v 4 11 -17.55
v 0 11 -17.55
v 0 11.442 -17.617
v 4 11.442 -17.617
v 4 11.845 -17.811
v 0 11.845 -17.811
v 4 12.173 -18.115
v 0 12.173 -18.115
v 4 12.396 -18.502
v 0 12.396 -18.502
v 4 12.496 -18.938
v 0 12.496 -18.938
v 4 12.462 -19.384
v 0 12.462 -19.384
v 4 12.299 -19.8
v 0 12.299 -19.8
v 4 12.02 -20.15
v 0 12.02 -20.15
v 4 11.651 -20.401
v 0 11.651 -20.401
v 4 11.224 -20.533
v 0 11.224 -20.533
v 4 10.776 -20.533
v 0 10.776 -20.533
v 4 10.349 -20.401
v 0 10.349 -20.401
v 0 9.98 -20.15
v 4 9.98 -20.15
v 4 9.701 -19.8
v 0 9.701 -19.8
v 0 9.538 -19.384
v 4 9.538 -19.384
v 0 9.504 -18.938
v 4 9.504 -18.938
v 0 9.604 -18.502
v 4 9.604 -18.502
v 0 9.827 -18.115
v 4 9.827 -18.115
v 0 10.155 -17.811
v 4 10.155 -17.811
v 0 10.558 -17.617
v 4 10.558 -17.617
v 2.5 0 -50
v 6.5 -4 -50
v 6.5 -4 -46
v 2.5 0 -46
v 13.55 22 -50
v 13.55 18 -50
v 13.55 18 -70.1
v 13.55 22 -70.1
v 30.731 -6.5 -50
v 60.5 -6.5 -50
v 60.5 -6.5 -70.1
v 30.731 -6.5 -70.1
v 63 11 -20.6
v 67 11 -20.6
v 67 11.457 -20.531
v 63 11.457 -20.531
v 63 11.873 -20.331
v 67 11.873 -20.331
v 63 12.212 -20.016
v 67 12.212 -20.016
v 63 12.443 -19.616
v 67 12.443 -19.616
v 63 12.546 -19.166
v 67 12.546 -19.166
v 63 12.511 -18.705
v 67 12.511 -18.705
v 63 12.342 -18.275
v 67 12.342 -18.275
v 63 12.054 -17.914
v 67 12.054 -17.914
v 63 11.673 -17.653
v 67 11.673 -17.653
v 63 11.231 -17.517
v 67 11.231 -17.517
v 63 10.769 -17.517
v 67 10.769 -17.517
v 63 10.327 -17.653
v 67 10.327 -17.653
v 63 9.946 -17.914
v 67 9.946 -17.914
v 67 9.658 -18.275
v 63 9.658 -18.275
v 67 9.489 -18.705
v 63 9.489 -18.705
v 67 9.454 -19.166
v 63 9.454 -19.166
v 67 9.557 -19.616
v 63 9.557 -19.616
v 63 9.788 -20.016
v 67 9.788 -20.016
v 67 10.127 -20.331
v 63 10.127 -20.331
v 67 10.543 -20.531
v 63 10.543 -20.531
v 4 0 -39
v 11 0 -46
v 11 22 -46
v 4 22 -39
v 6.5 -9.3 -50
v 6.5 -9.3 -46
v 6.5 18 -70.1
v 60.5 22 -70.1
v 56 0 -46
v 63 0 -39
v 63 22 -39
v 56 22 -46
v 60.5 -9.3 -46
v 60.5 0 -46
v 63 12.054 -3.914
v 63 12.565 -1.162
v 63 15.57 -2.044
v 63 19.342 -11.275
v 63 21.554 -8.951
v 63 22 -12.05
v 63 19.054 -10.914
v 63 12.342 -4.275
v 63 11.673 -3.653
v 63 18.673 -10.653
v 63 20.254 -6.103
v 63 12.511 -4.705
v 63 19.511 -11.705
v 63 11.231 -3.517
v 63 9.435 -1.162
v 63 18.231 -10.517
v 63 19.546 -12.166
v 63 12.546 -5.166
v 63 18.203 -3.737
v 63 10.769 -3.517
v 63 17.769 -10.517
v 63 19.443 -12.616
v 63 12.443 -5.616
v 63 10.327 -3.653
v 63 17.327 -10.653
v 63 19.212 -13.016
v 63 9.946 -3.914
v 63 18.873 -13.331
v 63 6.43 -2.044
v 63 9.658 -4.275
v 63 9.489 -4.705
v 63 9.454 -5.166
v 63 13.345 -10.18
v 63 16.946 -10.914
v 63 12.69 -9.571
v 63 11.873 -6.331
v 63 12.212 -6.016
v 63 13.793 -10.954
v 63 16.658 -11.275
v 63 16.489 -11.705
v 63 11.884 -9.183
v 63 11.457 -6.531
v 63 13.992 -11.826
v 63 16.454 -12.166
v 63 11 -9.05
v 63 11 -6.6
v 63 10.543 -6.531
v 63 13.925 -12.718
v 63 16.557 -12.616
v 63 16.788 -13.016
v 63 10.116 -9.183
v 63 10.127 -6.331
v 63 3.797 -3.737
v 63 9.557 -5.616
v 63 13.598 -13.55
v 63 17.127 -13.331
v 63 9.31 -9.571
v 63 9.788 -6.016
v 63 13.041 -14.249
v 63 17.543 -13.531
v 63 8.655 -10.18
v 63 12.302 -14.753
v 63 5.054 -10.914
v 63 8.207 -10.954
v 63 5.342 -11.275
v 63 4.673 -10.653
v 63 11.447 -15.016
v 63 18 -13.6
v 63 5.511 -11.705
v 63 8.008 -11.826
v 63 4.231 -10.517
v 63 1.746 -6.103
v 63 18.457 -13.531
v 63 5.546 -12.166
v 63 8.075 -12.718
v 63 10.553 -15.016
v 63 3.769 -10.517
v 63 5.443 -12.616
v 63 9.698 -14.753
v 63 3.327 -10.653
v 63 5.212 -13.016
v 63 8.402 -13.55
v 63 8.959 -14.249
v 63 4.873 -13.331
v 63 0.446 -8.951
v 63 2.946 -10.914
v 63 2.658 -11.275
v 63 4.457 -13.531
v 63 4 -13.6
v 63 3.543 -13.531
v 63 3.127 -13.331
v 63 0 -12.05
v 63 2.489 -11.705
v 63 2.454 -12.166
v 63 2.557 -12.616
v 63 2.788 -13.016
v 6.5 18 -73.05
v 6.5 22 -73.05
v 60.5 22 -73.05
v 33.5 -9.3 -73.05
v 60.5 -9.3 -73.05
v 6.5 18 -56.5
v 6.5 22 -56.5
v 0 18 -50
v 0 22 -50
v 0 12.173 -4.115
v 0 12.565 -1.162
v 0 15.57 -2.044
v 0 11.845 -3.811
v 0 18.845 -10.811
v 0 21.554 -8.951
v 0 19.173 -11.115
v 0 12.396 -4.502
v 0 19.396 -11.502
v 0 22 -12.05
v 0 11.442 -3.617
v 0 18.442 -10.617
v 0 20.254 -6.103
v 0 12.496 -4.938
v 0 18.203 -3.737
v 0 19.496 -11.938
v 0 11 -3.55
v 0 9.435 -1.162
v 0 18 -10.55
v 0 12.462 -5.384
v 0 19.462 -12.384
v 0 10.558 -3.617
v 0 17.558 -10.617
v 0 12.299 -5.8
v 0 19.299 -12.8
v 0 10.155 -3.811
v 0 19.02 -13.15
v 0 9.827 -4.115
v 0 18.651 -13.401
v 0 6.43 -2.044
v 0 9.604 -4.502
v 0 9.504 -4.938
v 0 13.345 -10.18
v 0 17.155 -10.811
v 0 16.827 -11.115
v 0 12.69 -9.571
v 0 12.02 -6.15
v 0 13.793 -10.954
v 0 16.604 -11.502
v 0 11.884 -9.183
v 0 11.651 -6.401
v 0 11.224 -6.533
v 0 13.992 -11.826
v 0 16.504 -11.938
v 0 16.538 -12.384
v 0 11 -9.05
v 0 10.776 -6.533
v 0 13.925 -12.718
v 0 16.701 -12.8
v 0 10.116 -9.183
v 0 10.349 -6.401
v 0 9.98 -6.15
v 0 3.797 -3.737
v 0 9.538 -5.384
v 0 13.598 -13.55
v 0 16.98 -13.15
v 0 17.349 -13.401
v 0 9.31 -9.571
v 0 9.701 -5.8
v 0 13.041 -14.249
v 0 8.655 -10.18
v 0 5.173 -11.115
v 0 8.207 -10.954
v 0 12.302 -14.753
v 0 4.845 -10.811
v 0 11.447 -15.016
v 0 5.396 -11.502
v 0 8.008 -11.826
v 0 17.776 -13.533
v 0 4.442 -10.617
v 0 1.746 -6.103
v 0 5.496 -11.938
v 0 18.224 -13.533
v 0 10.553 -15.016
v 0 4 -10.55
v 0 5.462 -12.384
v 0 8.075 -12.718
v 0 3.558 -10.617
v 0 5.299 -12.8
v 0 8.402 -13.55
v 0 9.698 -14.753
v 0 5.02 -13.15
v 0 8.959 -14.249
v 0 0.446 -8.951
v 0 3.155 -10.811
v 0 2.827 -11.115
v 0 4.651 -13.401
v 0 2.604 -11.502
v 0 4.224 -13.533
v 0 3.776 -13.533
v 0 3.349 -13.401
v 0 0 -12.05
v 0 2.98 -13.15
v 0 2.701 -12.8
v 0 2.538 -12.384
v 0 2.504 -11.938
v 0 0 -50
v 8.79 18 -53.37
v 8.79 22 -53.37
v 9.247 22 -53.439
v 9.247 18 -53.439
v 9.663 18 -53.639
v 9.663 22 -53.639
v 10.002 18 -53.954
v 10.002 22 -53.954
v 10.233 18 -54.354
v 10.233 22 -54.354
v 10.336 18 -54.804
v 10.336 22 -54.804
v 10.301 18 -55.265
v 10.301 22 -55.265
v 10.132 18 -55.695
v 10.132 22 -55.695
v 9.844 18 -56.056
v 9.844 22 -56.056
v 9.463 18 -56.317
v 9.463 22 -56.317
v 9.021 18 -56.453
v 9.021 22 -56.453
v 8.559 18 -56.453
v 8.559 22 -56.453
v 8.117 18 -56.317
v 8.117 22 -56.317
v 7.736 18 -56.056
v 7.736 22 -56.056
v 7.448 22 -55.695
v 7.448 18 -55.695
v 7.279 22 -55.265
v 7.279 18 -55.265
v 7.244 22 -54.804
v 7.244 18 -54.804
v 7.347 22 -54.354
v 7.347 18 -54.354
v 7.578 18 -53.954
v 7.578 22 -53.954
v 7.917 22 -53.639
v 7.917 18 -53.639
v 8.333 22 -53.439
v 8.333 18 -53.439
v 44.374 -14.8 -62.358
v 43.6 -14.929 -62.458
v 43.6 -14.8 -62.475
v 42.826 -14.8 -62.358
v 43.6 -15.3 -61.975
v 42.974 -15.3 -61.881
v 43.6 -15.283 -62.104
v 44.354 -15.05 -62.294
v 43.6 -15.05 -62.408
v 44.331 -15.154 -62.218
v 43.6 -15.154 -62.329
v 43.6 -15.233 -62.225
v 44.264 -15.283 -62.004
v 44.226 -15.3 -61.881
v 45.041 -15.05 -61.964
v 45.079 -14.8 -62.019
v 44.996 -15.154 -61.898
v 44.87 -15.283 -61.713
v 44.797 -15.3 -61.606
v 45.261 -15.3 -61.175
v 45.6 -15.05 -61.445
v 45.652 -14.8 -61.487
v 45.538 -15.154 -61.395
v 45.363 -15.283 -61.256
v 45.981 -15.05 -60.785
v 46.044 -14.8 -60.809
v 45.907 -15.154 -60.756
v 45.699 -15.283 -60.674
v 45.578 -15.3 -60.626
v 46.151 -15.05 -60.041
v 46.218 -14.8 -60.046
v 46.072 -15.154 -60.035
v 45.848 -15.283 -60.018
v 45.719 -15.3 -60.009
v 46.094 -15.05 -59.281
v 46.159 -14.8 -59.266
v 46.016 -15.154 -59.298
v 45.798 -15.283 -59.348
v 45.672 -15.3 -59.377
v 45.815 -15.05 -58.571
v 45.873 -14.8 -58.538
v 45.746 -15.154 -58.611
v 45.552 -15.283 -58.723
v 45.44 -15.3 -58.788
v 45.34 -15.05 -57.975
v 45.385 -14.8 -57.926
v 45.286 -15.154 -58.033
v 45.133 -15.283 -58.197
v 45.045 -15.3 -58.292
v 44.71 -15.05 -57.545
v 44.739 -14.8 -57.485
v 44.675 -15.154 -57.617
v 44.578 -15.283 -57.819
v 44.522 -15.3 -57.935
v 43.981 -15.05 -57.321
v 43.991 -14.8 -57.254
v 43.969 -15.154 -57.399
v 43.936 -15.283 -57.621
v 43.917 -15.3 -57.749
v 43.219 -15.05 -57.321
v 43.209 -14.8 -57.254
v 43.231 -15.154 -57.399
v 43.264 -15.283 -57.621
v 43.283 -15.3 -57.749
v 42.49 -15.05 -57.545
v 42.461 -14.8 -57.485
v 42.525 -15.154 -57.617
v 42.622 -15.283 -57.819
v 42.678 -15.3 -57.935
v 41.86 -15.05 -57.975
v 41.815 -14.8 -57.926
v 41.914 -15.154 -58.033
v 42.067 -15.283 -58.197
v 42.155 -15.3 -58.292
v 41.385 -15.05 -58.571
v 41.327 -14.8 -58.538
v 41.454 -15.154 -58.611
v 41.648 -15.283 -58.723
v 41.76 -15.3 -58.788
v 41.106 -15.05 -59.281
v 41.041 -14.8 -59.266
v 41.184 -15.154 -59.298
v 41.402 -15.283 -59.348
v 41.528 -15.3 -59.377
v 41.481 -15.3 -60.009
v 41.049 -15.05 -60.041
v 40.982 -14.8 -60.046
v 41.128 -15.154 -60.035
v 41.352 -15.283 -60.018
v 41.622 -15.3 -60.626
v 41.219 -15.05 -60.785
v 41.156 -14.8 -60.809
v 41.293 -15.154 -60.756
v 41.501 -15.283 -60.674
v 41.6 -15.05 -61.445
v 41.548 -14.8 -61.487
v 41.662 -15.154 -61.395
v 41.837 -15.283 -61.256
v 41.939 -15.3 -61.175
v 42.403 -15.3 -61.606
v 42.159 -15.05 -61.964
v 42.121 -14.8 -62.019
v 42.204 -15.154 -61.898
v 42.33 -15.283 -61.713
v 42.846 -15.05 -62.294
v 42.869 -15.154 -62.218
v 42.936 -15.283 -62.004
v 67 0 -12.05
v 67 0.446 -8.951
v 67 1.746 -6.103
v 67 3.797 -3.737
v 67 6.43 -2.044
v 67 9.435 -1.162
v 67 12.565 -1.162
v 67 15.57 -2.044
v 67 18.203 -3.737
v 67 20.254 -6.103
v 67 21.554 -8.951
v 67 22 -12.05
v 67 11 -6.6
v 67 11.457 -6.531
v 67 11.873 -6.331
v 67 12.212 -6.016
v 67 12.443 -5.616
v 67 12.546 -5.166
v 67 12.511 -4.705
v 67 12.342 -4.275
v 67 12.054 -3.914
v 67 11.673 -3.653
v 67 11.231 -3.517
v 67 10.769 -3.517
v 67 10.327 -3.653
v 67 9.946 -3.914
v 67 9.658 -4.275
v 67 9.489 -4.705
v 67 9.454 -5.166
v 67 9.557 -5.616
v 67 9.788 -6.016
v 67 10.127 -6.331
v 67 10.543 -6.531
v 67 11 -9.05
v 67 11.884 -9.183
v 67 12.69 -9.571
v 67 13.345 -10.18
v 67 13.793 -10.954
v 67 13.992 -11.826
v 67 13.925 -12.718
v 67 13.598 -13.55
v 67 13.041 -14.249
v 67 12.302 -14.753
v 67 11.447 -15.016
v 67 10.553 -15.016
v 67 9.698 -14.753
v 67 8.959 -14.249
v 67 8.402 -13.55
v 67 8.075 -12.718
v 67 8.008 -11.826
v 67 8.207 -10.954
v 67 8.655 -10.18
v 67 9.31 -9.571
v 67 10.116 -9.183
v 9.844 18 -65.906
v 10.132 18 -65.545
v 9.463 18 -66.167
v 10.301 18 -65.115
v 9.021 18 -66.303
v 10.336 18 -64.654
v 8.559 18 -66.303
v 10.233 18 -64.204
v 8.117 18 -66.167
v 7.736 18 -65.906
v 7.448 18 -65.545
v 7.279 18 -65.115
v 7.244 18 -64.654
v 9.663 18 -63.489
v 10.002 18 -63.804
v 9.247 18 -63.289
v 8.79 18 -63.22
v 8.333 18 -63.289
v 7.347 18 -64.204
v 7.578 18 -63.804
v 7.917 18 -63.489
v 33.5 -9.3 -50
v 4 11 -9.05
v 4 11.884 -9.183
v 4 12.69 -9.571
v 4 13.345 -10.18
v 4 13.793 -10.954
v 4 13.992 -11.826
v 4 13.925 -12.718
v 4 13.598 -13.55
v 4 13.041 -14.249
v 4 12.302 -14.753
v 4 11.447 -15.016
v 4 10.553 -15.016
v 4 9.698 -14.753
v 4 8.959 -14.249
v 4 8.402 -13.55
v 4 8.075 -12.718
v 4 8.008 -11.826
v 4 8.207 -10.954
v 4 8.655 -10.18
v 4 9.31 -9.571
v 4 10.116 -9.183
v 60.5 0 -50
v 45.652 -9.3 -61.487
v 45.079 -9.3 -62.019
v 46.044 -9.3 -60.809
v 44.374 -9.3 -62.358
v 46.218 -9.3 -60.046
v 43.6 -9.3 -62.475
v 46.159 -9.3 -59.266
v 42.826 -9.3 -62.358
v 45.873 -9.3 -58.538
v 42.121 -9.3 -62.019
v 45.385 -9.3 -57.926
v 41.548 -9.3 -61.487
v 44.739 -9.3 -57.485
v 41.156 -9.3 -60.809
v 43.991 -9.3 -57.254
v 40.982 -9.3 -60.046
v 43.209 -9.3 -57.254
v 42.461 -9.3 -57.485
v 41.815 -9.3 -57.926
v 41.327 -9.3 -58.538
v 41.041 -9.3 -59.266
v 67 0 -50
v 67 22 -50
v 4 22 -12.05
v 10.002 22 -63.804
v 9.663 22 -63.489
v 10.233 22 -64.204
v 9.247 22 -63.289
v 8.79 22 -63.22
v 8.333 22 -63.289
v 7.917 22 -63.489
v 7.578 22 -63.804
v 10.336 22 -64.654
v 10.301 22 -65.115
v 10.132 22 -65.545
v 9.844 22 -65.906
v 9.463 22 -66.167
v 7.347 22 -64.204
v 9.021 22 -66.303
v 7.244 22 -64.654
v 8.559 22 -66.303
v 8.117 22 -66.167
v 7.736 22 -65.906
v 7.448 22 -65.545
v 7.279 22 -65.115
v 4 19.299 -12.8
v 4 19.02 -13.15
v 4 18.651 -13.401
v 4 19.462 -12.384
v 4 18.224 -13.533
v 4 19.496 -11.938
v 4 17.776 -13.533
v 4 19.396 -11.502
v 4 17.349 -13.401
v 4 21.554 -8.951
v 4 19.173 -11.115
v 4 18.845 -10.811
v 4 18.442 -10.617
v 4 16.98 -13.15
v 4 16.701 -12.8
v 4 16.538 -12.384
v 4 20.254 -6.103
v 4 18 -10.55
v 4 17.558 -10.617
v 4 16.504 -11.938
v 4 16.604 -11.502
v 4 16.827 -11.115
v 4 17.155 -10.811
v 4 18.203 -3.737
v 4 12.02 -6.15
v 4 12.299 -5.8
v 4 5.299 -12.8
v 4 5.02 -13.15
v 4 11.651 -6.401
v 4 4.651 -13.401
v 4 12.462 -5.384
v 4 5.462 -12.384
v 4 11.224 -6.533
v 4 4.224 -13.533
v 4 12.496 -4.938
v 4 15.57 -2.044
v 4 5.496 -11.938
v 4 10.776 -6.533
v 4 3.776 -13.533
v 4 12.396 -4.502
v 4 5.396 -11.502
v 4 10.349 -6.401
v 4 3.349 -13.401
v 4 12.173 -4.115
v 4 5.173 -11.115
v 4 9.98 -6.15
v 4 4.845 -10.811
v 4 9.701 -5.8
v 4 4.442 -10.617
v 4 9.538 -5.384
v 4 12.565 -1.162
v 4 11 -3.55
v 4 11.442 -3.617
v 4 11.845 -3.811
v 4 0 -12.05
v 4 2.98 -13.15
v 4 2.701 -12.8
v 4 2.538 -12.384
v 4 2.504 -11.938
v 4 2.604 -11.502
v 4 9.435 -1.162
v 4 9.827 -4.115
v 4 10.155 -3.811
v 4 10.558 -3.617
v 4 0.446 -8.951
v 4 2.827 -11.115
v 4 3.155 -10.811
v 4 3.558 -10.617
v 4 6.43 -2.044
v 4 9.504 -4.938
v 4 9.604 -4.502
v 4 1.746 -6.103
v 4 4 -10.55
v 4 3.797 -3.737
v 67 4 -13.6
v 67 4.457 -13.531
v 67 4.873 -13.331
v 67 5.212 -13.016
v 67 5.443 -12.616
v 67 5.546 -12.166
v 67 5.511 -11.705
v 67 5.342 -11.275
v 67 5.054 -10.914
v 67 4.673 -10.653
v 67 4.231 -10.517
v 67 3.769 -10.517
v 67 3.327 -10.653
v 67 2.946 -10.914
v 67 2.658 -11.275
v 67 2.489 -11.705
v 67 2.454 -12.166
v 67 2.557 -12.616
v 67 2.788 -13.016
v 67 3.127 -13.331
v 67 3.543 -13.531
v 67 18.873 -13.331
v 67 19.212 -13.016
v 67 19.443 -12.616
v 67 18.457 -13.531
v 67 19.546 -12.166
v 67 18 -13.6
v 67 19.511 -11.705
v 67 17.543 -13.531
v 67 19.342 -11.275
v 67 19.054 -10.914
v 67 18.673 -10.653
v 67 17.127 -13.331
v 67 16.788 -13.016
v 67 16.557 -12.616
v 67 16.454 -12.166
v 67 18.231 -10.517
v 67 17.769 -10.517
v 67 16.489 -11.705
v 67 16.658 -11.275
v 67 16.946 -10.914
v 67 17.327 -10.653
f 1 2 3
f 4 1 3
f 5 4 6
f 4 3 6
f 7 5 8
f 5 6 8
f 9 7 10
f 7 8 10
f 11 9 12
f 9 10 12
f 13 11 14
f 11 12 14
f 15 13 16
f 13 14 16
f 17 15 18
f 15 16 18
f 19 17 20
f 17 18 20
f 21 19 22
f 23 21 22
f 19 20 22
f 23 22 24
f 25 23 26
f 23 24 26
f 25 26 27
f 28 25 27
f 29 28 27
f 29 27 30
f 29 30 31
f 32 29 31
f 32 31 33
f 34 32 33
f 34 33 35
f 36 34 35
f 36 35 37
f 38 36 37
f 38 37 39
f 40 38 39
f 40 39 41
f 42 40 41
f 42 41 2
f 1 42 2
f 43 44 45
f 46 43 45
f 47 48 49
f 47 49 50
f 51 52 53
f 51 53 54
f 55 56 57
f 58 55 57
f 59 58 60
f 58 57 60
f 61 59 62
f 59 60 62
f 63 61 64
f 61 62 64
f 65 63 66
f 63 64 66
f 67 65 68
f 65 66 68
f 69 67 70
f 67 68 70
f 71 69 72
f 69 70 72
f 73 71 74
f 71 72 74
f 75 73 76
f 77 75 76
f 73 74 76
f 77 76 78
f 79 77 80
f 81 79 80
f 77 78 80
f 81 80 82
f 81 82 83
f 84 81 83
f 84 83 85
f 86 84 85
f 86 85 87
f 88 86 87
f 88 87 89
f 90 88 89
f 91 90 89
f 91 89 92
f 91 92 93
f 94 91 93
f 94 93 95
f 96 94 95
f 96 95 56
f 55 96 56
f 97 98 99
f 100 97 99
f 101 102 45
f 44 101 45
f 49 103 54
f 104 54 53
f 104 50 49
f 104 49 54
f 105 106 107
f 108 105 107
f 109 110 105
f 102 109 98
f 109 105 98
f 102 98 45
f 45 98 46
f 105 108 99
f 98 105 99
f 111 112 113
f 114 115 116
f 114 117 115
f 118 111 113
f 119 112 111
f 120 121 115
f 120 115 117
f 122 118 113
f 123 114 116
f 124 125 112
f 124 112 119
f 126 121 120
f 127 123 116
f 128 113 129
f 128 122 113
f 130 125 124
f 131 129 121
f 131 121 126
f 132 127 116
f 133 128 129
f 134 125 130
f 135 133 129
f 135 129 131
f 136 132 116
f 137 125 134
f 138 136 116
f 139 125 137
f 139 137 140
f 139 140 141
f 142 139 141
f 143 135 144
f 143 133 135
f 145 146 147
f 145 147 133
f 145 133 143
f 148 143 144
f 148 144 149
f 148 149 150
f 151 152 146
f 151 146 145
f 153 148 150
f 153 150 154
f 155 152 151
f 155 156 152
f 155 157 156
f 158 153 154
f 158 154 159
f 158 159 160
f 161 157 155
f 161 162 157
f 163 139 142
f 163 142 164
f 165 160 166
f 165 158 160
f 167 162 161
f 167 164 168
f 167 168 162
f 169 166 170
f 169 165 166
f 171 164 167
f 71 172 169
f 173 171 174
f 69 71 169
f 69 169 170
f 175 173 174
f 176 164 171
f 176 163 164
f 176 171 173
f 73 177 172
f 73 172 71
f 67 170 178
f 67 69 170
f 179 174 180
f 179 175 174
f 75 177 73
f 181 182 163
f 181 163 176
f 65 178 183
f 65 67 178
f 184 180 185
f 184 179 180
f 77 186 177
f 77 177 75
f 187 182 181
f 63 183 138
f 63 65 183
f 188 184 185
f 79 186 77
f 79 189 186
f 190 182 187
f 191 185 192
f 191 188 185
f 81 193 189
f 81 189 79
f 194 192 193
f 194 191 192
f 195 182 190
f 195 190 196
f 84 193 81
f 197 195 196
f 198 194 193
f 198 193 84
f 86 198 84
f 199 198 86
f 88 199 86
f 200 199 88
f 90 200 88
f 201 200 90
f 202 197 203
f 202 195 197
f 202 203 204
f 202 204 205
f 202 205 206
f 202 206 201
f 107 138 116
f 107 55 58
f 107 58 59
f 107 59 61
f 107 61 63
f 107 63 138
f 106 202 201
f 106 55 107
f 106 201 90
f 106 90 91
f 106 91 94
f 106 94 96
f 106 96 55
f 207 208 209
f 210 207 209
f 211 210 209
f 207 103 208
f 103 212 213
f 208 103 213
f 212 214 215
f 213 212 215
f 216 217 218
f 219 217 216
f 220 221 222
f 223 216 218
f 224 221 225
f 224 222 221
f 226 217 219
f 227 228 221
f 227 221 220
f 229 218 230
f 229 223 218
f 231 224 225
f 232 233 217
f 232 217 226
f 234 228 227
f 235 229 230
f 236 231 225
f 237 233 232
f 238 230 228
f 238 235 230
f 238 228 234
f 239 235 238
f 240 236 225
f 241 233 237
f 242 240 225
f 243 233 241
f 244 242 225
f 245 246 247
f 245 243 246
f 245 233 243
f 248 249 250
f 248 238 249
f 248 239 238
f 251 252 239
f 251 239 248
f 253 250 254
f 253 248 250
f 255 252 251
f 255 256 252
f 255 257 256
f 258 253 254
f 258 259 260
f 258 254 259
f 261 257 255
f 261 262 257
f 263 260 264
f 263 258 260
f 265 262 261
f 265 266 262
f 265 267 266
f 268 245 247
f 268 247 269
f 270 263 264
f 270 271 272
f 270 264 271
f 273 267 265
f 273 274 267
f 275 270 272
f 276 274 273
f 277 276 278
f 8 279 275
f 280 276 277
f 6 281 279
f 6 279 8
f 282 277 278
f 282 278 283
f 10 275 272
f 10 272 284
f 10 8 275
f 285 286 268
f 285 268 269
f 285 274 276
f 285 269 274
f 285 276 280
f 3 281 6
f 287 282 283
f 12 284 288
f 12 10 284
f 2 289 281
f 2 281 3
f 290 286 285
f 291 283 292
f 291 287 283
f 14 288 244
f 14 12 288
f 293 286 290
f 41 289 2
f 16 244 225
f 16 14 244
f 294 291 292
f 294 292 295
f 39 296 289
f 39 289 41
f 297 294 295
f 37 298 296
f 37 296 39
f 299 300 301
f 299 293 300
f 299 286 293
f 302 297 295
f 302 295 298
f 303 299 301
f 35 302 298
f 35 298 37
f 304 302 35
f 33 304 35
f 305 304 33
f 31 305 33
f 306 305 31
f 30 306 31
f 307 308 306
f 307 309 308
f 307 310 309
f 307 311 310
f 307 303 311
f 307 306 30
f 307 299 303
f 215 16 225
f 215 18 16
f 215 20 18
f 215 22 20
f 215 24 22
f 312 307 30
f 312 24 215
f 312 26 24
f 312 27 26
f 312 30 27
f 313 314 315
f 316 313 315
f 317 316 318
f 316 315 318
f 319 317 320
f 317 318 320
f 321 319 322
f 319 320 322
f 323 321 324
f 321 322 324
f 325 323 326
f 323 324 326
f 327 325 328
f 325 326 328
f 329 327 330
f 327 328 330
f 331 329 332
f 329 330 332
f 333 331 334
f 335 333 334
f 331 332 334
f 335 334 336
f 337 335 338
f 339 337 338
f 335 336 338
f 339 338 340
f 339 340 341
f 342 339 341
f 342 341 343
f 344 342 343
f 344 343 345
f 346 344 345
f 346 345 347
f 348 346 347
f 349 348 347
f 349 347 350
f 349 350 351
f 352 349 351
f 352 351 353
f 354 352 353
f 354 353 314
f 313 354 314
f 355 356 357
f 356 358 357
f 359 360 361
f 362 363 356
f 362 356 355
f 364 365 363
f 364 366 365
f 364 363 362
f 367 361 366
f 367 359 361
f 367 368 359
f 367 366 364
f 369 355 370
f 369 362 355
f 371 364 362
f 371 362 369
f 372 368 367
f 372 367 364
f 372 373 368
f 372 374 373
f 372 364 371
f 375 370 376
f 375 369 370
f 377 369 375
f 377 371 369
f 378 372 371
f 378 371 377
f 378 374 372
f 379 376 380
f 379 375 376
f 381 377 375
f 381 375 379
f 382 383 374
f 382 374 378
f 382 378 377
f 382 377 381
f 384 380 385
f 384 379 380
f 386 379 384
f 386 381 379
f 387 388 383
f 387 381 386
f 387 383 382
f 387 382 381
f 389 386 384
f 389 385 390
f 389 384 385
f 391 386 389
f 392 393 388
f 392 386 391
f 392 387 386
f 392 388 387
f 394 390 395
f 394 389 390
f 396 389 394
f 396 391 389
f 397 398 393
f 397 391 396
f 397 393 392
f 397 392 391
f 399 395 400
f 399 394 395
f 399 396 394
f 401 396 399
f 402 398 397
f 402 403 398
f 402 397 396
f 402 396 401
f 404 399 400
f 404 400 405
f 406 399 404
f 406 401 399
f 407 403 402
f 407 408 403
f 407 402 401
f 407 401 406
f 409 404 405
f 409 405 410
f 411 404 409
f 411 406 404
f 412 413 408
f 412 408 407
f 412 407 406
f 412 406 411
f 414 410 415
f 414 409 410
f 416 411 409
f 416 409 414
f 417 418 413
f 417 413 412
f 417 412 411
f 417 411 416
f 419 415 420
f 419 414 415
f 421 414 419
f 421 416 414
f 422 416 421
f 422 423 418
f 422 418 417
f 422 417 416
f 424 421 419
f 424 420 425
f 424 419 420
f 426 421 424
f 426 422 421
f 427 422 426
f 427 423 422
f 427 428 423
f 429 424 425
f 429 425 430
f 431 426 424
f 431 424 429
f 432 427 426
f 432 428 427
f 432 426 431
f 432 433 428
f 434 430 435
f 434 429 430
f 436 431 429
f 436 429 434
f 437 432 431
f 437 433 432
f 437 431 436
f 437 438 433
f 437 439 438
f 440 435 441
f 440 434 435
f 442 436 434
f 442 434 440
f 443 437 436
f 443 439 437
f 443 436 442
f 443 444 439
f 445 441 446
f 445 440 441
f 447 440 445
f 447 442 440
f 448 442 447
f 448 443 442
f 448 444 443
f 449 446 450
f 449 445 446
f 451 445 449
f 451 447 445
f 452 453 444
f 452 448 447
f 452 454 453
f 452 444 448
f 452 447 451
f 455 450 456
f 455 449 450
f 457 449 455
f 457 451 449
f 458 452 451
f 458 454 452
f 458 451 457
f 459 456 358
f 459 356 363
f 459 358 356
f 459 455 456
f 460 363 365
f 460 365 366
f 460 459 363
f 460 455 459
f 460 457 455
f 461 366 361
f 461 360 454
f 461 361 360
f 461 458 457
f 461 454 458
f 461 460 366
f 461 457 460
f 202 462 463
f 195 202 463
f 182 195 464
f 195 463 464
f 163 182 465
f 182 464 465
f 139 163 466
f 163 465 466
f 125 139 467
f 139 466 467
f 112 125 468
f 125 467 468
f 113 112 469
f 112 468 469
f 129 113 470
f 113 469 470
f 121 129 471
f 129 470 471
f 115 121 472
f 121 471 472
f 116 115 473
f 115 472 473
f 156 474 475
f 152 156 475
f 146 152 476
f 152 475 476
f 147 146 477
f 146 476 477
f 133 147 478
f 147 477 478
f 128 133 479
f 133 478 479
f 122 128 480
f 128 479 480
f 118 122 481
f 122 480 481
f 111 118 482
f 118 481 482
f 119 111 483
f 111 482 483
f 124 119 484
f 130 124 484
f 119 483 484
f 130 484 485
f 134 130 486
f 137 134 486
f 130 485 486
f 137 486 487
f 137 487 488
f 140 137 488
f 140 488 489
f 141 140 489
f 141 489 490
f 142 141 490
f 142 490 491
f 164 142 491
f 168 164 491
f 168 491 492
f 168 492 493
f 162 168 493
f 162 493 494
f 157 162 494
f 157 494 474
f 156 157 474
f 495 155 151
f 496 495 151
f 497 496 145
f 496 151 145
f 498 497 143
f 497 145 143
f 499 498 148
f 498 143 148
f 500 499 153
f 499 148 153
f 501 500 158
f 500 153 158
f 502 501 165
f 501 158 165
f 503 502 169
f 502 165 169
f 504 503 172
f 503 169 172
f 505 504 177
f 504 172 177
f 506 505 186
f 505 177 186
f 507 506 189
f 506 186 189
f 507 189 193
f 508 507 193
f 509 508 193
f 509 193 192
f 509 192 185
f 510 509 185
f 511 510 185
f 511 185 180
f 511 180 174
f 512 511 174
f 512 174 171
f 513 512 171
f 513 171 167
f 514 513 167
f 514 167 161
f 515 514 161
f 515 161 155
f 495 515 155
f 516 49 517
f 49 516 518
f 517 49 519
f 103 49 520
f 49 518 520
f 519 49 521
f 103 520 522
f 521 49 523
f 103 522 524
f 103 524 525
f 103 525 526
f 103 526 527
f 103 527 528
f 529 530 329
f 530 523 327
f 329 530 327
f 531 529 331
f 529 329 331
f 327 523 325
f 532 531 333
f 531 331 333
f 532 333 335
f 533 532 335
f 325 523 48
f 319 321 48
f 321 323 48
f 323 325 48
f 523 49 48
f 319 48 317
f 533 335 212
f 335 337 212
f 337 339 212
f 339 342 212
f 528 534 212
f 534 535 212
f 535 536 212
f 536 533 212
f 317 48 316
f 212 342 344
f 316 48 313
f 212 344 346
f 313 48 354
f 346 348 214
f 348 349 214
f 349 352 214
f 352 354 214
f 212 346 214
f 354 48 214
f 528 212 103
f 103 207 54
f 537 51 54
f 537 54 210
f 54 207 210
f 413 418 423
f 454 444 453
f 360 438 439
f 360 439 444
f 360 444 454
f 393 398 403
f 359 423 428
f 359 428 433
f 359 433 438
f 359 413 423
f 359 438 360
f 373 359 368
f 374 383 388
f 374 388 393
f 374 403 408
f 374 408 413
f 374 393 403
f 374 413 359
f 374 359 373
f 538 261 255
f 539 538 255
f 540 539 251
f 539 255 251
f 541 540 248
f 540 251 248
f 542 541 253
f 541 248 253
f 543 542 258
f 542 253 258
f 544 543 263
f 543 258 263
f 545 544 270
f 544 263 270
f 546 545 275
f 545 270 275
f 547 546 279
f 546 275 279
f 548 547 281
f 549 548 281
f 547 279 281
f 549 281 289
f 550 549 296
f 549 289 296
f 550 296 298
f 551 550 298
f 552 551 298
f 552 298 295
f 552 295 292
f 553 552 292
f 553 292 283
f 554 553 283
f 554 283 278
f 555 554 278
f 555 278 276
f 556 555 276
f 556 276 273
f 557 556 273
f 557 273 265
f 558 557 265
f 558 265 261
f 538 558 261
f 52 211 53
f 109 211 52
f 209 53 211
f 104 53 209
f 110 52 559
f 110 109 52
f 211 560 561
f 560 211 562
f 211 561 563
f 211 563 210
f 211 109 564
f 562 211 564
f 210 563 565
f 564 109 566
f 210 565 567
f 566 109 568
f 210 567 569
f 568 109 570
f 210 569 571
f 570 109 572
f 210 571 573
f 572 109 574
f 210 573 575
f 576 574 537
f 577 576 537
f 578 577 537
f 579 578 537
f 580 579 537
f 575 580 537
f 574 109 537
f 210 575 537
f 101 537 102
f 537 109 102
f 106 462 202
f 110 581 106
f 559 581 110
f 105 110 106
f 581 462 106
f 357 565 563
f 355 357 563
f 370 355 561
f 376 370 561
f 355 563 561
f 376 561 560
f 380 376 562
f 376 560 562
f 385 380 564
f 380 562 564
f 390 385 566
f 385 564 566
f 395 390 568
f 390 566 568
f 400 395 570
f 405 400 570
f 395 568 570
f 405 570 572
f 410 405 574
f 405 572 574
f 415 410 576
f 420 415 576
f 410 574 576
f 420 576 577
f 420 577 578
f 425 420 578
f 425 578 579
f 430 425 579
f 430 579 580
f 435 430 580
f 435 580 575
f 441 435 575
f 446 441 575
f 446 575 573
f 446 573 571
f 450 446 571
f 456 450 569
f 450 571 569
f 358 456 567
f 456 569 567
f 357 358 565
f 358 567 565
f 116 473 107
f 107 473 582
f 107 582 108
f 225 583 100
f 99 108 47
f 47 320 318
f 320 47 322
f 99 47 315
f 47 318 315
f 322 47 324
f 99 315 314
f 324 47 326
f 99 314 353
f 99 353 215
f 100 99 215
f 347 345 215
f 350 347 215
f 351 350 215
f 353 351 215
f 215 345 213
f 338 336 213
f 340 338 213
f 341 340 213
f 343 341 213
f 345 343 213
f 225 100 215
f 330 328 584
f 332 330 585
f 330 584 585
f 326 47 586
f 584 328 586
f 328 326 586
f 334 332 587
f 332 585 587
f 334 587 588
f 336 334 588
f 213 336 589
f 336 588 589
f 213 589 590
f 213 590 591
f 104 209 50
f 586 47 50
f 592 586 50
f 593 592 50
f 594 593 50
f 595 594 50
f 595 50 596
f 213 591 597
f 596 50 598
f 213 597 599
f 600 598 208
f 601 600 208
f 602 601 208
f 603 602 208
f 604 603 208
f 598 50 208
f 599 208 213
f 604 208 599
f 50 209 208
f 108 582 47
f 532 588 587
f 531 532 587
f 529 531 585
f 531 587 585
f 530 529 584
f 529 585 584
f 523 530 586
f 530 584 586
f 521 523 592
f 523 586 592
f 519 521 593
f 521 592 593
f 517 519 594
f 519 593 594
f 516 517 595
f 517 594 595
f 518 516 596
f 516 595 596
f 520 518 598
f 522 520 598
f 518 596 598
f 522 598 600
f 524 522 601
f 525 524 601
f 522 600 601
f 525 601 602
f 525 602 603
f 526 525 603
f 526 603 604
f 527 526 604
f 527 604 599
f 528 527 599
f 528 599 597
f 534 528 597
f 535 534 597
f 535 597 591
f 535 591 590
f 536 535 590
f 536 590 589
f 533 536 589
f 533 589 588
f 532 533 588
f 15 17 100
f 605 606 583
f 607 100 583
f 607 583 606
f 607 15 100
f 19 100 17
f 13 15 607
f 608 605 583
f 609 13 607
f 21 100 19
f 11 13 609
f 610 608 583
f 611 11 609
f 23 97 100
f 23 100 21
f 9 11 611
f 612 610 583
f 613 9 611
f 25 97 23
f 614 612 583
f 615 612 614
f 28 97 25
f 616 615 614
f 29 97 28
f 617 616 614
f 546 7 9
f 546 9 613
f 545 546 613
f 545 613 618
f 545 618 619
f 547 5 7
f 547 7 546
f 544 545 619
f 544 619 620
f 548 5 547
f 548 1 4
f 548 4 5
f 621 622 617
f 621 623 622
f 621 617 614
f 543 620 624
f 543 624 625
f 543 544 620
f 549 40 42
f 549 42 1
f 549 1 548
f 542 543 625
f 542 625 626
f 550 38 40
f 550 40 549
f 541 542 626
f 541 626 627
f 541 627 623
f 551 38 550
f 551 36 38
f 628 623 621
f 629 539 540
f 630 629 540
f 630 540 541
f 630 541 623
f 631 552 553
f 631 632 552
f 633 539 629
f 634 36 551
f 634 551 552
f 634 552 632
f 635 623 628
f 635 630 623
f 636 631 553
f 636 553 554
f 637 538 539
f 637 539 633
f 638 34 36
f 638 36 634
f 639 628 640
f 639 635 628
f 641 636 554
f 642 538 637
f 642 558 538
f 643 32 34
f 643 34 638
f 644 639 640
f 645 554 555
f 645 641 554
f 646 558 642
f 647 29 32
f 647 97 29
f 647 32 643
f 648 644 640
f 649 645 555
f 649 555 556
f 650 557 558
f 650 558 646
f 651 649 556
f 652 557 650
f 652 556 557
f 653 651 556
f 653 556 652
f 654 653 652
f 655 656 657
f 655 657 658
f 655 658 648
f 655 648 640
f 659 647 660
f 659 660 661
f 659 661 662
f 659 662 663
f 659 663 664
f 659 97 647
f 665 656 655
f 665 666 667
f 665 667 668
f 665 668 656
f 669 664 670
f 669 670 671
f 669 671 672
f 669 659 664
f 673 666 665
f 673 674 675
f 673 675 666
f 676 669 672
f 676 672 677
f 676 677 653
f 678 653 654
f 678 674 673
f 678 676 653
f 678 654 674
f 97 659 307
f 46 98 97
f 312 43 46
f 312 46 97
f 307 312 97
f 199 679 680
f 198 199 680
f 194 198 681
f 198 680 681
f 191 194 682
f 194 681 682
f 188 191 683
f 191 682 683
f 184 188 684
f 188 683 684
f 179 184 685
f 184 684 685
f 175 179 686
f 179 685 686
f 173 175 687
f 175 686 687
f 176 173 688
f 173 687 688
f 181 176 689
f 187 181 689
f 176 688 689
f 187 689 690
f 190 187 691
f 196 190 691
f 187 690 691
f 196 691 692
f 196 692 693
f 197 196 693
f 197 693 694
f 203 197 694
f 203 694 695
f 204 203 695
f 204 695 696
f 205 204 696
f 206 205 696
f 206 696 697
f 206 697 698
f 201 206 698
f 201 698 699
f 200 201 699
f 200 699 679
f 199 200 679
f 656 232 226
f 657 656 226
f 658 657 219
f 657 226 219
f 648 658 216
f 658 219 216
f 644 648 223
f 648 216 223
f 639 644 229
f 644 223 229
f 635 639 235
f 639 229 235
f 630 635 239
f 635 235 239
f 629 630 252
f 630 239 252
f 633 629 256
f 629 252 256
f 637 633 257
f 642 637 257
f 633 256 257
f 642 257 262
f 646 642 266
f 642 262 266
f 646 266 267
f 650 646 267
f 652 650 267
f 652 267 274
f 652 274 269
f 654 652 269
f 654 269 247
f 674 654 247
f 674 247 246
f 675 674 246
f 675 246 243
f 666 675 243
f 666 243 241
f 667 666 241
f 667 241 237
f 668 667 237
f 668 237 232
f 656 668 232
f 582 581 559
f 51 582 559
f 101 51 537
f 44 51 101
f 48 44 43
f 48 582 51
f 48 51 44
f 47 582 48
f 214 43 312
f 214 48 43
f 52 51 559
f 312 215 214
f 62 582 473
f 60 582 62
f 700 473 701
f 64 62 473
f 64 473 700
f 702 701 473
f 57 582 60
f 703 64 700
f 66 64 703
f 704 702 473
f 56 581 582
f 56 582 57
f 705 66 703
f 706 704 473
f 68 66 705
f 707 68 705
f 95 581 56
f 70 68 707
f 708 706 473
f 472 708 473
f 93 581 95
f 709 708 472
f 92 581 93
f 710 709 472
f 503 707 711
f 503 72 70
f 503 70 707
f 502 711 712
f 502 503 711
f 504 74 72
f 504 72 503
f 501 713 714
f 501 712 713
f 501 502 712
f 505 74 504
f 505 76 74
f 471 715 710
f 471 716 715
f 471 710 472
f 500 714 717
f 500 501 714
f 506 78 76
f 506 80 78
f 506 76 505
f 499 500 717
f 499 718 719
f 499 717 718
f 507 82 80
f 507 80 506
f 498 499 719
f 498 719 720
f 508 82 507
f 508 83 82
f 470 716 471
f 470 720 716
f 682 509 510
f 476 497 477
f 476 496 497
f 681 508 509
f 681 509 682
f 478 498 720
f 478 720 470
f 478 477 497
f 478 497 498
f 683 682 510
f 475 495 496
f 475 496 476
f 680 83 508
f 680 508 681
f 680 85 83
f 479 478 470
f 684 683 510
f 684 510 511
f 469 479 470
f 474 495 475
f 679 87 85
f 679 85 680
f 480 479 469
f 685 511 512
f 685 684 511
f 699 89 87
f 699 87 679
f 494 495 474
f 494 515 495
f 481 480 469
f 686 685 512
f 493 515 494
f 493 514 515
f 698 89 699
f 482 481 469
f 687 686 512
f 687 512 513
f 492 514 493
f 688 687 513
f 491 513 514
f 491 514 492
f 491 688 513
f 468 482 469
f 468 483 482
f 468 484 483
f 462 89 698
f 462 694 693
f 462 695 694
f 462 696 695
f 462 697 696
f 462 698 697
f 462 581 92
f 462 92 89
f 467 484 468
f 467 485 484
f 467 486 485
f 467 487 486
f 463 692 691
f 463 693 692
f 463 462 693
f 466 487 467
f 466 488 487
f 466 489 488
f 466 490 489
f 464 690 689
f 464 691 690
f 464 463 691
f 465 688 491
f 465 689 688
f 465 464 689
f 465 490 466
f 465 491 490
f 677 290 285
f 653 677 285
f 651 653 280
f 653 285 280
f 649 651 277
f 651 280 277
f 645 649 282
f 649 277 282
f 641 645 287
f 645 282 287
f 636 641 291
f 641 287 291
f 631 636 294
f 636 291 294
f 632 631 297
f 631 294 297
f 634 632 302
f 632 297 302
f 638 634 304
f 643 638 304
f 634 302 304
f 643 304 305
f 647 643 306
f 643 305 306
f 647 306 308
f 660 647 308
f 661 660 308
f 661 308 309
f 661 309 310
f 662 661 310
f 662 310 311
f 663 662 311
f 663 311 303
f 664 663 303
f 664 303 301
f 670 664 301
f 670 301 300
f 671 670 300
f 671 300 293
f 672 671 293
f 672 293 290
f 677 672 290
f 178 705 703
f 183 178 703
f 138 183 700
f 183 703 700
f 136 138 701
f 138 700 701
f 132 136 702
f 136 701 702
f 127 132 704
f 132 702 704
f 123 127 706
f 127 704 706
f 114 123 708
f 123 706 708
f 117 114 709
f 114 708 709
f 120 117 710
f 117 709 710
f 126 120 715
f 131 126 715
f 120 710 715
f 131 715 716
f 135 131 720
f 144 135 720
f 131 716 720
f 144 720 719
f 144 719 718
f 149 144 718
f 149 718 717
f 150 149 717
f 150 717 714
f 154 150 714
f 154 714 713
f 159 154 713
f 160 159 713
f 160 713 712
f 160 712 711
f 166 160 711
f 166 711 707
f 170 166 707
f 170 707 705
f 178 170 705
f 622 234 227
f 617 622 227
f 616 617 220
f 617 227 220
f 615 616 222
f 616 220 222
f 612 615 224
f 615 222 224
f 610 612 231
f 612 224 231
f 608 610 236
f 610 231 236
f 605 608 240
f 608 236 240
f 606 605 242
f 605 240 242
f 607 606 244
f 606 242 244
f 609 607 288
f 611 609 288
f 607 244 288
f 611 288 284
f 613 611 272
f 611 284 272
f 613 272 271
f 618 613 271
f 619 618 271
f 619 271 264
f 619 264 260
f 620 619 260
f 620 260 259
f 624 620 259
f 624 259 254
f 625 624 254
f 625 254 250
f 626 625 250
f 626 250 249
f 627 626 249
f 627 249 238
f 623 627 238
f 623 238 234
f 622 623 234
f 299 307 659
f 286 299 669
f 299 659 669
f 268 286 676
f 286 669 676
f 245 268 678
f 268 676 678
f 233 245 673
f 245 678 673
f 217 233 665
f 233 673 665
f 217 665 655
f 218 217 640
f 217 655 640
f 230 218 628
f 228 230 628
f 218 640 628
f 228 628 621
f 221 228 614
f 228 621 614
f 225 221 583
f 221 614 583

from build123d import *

# Parameters (mm, degrees)
BOSS_EXTRUDE1_DEPTH      = 22
SKETCH3_R                = 1.55
CUT_EXTRUDE1_DEPTH       = 30
CUT_EXTRUDE5_DEPTH       = 9
SKETCH11_R               = 1.55
CUT_EXTRUDE10_DEPTH      = 13
CUT_EXTRUDE11_START      = -10
CUT_EXTRUDE11_DEPTH      = 10
SKETCH13_R               = 3
SKETCH13_R_2             = 1.5
CUT_EXTRUDE12_DEPTH      = 85
FILLET1_SIZE             = 7
SKETCH14_W               = 54
SKETCH14_H               = 9.3
SKETCH14_W_2             = 7.05
SKETCH14_H_2             = 4
BOSS_EXTRUDE4_DEPTH      = 4
SKETCH17_W               = 7.05
SKETCH17_H               = 4
BOSS_EXTRUDE5_DEPTH      = 23.05
BOSS_EXTRUDE6_DEPTH      = 27.3
BOSS_EXTRUDE6_DEPTH_BACK = 4
SKETCH18_W               = 54
SKETCH18_H               = 2.95
SKETCH19_W               = 54
SKETCH19_H               = 2.8
BOSS_EXTRUDE7_DEPTH      = 21
FILLET2_SIZE             = 6.5
FILLET7_SIZE             = 4
SKETCH26_R               = 1.55
CUT_EXTRUDE18_DEPTH      = 11.5
CUT_EXTRUDE19_START      = -4
CUT_EXTRUDE19_OUTLINE_R  = 1.55
CUT_EXTRUDE19_DEPTH      = 4
CUT_EXTRUDE21_DEPTH      = 23.05
SKETCH31_R               = 2.625
BOSS_EXTRUDE8_DEPTH      = 6
FILLET8_R                = 0.5


# Read off the part's stored shape, not the designer's step: Cut-Extrude19
with BuildPart() as part:
    # Sketch1 → Boss-Extrude1 (new body)
    with BuildSketch(Plane(origin=(0, 0, 0), x_dir=(1, 0, 0), z_dir=(0, 1, 0))):
        Polygon((0, 0), (0, 50), (67, 50), (67, 0), (63, 0), (63, 46), (4, 46), (4, 0), align=None)
    extrude(amount=BOSS_EXTRUDE1_DEPTH)

    # Sketch3 → Cut-Extrude1 (cut)
    with BuildSketch(Plane(origin=(67, 0, 0), x_dir=(0, 0, -1), z_dir=(1, 0, 0))):
        with Locations((12.05, 11)):
            Circle(SKETCH3_R)
    extrude(amount=-CUT_EXTRUDE1_DEPTH, mode=Mode.SUBTRACT)

    # Sketch5 → Cut-Extrude5 (cut)
    with BuildSketch(Plane(origin=(67, 0, 0), x_dir=(0, 0, -1), z_dir=(1, 0, 0))):
        with BuildLine():
            Line((12.05, 22), (0, 22))
            Line((0, 22), (0, 0))
            Line((0, 0), (12.05, 0))
            ThreePointArc((12.05, 0), (1.05, 11), (12.05, 22))
        make_face()
    extrude(amount=-CUT_EXTRUDE5_DEPTH, mode=Mode.SUBTRACT)

    # Sketch11 → Cut-Extrude10 (cut)
    with BuildSketch(Plane(origin=(67, 0, 0), x_dir=(0, 0, -1), z_dir=(1, 0, 0))):
        with Locations((19.05, 11)):
            Circle(SKETCH11_R)
        with Locations((12.05, 18)):
            Circle(SKETCH11_R)
        with Locations((12.05, 4)):
            Circle(SKETCH11_R)
        with Locations((5.05, 11)):
            Circle(SKETCH11_R)
    extrude(amount=-CUT_EXTRUDE10_DEPTH, mode=Mode.SUBTRACT)

    # Sketch12 → Cut-Extrude11 (cut)
    with BuildSketch(Plane.ZY.offset(CUT_EXTRUDE11_START)):
        with BuildLine():
            Line((-12.05, 22), (0, 22))
            Line((0, 22), (0, 0))
            Line((0, 0), (-12.05, 0))
            ThreePointArc((-12.05, 0), (-1.05, 11), (-12.05, 22))
        make_face()
    extrude(amount=CUT_EXTRUDE11_DEPTH, mode=Mode.SUBTRACT)

    # Sketch13 → Cut-Extrude12 (cut)
    with BuildSketch(Plane.ZY):
        with Locations((-12.05, 11)):
            Circle(SKETCH13_R)
        with Locations((-19.05, 11)):
            Circle(SKETCH13_R_2)
        with Locations((-12.05, 4)):
            Circle(SKETCH13_R_2)
        with Locations((-5.05, 11)):
            Circle(SKETCH13_R_2)
        with Locations((-12.05, 18)):
            Circle(SKETCH13_R_2)
    extrude(amount=-CUT_EXTRUDE12_DEPTH, mode=Mode.SUBTRACT)

    # Fillet1
    fillet1_edges = [part.edges().sort_by_distance(p)[0] for p in [
        (63, 11, -46),
        (4, 11, -46),
    ]]
    chamfer(fillet1_edges, length=FILLET1_SIZE)

    # Sketch14 → Boss-Extrude4 (add)
    with BuildSketch(Plane(origin=(0, 0, -50), x_dir=(-1, 0, 0), z_dir=(0, 0, -1))):
        with Locations((-33.5, -4.65)):
            Rectangle(SKETCH14_W, SKETCH14_H)
        with Locations((-56.975, 20)):
            Rectangle(SKETCH14_W_2, SKETCH14_H_2)
        with Locations((-10.025, 20)):
            Rectangle(SKETCH14_W_2, SKETCH14_H_2)
    extrude(amount=-BOSS_EXTRUDE4_DEPTH)

    # Sketch17 → Boss-Extrude5 (add)
    with BuildSketch(Plane(origin=(0, 0, -50), x_dir=(-1, 0, 0), z_dir=(0, 0, -1))):
        with Locations((-56.975, 20)):
            Rectangle(SKETCH17_W, SKETCH17_H)
        with Locations((-10.025, 20)):
            Rectangle(SKETCH17_W, SKETCH17_H)
    extrude(amount=BOSS_EXTRUDE5_DEPTH)

    # Sketch18 → Boss-Extrude6 (add, two sides: drawn at the far end of the back side and taken through both)
    with BuildSketch(Plane.XZ.offset(-18).offset(-BOSS_EXTRUDE6_DEPTH_BACK)):
        with Locations((33.5, -71.575)):
            Rectangle(SKETCH18_W, SKETCH18_H)
    extrude(amount=BOSS_EXTRUDE6_DEPTH + BOSS_EXTRUDE6_DEPTH_BACK)

    # Sketch19 → Boss-Extrude7 (add)
    with BuildSketch(Plane(origin=(0, 0, -50), x_dir=(-1, 0, 0), z_dir=(0, 0, -1))):
        with Locations((-33.5, -7.9)):
            Rectangle(SKETCH19_W, SKETCH19_H)
    extrude(amount=BOSS_EXTRUDE7_DEPTH)

    # Fillet2
    fillet2_edges = [part.edges().sort_by_distance(p)[0] for p in [
        (60.5, 20, -50),
        (6.5, 20, -50),
    ]]
    chamfer(fillet2_edges, length=FILLET2_SIZE - 0.0001)  # a hair under: the kernel refuses the full size

    # Fillet7
    fillet7_edges = [part.edges().sort_by_distance(p)[0] for p in [
        (6.5, 0, -48),
    ]]
    chamfer(fillet7_edges, length=FILLET7_SIZE)

    # Sketch26 → Cut-Extrude18 (cut)
    with BuildSketch(Plane(origin=(0, 22, 0), x_dir=(1, 0, 0), z_dir=(0, 1, 0))):
        with Locations(Location((58.21, 64.77, 0), (0, 0, 270))):
            Circle(SKETCH26_R)
        with Locations(Location((58.21, 54.92, 0), (0, 0, 270))):
            Circle(SKETCH26_R)
        with Locations(Location((8.79, 54.92, 0), (0, 0, 270))):
            Circle(SKETCH26_R)
        with Locations(Location((8.79, 64.77, 0), (0, 0, 270))):
            Circle(SKETCH26_R)
    extrude(amount=-CUT_EXTRUDE18_DEPTH, mode=Mode.SUBTRACT)

    # Cut-Extrude19 outline → Cut-Extrude19 (cut)
    with BuildSketch(Plane(origin=(0, 22, 0), x_dir=(1, 0, 0), z_dir=(0, 1, 0)).offset(CUT_EXTRUDE19_START)):
        Polygon((53.45, 70.1), (53.45, 50), (67, 50), (60.5, 56.5), (60.5, 70.1), align=None)
        with Locations((58.21, 54.92)):
            Circle(CUT_EXTRUDE19_OUTLINE_R, mode=Mode.SUBTRACT)
        with Locations((58.21, 64.77)):
            Circle(CUT_EXTRUDE19_OUTLINE_R, mode=Mode.SUBTRACT)
    extrude(amount=CUT_EXTRUDE19_DEPTH, mode=Mode.SUBTRACT)

    # Sketch30 → Cut-Extrude21 (cut)
    with BuildSketch(Plane(origin=(0, 0, -73.05), x_dir=(-1, 0, 0), z_dir=(0, 0, -1))):
        Polygon((-6.5, 18), (-33.5, -9.3), (-6.5, -9.3), align=None)
    extrude(amount=-CUT_EXTRUDE21_DEPTH, mode=Mode.SUBTRACT)

    # Sketch31 → Boss-Extrude8 (add)
    with BuildSketch(Plane.XZ.offset(9.3)):
        with Locations(Location((43.6, -59.85, 0), (0, 0, 270))):
            Circle(SKETCH31_R)
    extrude(amount=BOSS_EXTRUDE8_DEPTH)

    # Fillet8
    fillet8_edges = [part.edges().sort_by_distance(p)[0] for p in [
        (43.6, -15.3, -57.225),
    ]]
    fillet(fillet8_edges, radius=FILLET8_R)


solid = part.part
